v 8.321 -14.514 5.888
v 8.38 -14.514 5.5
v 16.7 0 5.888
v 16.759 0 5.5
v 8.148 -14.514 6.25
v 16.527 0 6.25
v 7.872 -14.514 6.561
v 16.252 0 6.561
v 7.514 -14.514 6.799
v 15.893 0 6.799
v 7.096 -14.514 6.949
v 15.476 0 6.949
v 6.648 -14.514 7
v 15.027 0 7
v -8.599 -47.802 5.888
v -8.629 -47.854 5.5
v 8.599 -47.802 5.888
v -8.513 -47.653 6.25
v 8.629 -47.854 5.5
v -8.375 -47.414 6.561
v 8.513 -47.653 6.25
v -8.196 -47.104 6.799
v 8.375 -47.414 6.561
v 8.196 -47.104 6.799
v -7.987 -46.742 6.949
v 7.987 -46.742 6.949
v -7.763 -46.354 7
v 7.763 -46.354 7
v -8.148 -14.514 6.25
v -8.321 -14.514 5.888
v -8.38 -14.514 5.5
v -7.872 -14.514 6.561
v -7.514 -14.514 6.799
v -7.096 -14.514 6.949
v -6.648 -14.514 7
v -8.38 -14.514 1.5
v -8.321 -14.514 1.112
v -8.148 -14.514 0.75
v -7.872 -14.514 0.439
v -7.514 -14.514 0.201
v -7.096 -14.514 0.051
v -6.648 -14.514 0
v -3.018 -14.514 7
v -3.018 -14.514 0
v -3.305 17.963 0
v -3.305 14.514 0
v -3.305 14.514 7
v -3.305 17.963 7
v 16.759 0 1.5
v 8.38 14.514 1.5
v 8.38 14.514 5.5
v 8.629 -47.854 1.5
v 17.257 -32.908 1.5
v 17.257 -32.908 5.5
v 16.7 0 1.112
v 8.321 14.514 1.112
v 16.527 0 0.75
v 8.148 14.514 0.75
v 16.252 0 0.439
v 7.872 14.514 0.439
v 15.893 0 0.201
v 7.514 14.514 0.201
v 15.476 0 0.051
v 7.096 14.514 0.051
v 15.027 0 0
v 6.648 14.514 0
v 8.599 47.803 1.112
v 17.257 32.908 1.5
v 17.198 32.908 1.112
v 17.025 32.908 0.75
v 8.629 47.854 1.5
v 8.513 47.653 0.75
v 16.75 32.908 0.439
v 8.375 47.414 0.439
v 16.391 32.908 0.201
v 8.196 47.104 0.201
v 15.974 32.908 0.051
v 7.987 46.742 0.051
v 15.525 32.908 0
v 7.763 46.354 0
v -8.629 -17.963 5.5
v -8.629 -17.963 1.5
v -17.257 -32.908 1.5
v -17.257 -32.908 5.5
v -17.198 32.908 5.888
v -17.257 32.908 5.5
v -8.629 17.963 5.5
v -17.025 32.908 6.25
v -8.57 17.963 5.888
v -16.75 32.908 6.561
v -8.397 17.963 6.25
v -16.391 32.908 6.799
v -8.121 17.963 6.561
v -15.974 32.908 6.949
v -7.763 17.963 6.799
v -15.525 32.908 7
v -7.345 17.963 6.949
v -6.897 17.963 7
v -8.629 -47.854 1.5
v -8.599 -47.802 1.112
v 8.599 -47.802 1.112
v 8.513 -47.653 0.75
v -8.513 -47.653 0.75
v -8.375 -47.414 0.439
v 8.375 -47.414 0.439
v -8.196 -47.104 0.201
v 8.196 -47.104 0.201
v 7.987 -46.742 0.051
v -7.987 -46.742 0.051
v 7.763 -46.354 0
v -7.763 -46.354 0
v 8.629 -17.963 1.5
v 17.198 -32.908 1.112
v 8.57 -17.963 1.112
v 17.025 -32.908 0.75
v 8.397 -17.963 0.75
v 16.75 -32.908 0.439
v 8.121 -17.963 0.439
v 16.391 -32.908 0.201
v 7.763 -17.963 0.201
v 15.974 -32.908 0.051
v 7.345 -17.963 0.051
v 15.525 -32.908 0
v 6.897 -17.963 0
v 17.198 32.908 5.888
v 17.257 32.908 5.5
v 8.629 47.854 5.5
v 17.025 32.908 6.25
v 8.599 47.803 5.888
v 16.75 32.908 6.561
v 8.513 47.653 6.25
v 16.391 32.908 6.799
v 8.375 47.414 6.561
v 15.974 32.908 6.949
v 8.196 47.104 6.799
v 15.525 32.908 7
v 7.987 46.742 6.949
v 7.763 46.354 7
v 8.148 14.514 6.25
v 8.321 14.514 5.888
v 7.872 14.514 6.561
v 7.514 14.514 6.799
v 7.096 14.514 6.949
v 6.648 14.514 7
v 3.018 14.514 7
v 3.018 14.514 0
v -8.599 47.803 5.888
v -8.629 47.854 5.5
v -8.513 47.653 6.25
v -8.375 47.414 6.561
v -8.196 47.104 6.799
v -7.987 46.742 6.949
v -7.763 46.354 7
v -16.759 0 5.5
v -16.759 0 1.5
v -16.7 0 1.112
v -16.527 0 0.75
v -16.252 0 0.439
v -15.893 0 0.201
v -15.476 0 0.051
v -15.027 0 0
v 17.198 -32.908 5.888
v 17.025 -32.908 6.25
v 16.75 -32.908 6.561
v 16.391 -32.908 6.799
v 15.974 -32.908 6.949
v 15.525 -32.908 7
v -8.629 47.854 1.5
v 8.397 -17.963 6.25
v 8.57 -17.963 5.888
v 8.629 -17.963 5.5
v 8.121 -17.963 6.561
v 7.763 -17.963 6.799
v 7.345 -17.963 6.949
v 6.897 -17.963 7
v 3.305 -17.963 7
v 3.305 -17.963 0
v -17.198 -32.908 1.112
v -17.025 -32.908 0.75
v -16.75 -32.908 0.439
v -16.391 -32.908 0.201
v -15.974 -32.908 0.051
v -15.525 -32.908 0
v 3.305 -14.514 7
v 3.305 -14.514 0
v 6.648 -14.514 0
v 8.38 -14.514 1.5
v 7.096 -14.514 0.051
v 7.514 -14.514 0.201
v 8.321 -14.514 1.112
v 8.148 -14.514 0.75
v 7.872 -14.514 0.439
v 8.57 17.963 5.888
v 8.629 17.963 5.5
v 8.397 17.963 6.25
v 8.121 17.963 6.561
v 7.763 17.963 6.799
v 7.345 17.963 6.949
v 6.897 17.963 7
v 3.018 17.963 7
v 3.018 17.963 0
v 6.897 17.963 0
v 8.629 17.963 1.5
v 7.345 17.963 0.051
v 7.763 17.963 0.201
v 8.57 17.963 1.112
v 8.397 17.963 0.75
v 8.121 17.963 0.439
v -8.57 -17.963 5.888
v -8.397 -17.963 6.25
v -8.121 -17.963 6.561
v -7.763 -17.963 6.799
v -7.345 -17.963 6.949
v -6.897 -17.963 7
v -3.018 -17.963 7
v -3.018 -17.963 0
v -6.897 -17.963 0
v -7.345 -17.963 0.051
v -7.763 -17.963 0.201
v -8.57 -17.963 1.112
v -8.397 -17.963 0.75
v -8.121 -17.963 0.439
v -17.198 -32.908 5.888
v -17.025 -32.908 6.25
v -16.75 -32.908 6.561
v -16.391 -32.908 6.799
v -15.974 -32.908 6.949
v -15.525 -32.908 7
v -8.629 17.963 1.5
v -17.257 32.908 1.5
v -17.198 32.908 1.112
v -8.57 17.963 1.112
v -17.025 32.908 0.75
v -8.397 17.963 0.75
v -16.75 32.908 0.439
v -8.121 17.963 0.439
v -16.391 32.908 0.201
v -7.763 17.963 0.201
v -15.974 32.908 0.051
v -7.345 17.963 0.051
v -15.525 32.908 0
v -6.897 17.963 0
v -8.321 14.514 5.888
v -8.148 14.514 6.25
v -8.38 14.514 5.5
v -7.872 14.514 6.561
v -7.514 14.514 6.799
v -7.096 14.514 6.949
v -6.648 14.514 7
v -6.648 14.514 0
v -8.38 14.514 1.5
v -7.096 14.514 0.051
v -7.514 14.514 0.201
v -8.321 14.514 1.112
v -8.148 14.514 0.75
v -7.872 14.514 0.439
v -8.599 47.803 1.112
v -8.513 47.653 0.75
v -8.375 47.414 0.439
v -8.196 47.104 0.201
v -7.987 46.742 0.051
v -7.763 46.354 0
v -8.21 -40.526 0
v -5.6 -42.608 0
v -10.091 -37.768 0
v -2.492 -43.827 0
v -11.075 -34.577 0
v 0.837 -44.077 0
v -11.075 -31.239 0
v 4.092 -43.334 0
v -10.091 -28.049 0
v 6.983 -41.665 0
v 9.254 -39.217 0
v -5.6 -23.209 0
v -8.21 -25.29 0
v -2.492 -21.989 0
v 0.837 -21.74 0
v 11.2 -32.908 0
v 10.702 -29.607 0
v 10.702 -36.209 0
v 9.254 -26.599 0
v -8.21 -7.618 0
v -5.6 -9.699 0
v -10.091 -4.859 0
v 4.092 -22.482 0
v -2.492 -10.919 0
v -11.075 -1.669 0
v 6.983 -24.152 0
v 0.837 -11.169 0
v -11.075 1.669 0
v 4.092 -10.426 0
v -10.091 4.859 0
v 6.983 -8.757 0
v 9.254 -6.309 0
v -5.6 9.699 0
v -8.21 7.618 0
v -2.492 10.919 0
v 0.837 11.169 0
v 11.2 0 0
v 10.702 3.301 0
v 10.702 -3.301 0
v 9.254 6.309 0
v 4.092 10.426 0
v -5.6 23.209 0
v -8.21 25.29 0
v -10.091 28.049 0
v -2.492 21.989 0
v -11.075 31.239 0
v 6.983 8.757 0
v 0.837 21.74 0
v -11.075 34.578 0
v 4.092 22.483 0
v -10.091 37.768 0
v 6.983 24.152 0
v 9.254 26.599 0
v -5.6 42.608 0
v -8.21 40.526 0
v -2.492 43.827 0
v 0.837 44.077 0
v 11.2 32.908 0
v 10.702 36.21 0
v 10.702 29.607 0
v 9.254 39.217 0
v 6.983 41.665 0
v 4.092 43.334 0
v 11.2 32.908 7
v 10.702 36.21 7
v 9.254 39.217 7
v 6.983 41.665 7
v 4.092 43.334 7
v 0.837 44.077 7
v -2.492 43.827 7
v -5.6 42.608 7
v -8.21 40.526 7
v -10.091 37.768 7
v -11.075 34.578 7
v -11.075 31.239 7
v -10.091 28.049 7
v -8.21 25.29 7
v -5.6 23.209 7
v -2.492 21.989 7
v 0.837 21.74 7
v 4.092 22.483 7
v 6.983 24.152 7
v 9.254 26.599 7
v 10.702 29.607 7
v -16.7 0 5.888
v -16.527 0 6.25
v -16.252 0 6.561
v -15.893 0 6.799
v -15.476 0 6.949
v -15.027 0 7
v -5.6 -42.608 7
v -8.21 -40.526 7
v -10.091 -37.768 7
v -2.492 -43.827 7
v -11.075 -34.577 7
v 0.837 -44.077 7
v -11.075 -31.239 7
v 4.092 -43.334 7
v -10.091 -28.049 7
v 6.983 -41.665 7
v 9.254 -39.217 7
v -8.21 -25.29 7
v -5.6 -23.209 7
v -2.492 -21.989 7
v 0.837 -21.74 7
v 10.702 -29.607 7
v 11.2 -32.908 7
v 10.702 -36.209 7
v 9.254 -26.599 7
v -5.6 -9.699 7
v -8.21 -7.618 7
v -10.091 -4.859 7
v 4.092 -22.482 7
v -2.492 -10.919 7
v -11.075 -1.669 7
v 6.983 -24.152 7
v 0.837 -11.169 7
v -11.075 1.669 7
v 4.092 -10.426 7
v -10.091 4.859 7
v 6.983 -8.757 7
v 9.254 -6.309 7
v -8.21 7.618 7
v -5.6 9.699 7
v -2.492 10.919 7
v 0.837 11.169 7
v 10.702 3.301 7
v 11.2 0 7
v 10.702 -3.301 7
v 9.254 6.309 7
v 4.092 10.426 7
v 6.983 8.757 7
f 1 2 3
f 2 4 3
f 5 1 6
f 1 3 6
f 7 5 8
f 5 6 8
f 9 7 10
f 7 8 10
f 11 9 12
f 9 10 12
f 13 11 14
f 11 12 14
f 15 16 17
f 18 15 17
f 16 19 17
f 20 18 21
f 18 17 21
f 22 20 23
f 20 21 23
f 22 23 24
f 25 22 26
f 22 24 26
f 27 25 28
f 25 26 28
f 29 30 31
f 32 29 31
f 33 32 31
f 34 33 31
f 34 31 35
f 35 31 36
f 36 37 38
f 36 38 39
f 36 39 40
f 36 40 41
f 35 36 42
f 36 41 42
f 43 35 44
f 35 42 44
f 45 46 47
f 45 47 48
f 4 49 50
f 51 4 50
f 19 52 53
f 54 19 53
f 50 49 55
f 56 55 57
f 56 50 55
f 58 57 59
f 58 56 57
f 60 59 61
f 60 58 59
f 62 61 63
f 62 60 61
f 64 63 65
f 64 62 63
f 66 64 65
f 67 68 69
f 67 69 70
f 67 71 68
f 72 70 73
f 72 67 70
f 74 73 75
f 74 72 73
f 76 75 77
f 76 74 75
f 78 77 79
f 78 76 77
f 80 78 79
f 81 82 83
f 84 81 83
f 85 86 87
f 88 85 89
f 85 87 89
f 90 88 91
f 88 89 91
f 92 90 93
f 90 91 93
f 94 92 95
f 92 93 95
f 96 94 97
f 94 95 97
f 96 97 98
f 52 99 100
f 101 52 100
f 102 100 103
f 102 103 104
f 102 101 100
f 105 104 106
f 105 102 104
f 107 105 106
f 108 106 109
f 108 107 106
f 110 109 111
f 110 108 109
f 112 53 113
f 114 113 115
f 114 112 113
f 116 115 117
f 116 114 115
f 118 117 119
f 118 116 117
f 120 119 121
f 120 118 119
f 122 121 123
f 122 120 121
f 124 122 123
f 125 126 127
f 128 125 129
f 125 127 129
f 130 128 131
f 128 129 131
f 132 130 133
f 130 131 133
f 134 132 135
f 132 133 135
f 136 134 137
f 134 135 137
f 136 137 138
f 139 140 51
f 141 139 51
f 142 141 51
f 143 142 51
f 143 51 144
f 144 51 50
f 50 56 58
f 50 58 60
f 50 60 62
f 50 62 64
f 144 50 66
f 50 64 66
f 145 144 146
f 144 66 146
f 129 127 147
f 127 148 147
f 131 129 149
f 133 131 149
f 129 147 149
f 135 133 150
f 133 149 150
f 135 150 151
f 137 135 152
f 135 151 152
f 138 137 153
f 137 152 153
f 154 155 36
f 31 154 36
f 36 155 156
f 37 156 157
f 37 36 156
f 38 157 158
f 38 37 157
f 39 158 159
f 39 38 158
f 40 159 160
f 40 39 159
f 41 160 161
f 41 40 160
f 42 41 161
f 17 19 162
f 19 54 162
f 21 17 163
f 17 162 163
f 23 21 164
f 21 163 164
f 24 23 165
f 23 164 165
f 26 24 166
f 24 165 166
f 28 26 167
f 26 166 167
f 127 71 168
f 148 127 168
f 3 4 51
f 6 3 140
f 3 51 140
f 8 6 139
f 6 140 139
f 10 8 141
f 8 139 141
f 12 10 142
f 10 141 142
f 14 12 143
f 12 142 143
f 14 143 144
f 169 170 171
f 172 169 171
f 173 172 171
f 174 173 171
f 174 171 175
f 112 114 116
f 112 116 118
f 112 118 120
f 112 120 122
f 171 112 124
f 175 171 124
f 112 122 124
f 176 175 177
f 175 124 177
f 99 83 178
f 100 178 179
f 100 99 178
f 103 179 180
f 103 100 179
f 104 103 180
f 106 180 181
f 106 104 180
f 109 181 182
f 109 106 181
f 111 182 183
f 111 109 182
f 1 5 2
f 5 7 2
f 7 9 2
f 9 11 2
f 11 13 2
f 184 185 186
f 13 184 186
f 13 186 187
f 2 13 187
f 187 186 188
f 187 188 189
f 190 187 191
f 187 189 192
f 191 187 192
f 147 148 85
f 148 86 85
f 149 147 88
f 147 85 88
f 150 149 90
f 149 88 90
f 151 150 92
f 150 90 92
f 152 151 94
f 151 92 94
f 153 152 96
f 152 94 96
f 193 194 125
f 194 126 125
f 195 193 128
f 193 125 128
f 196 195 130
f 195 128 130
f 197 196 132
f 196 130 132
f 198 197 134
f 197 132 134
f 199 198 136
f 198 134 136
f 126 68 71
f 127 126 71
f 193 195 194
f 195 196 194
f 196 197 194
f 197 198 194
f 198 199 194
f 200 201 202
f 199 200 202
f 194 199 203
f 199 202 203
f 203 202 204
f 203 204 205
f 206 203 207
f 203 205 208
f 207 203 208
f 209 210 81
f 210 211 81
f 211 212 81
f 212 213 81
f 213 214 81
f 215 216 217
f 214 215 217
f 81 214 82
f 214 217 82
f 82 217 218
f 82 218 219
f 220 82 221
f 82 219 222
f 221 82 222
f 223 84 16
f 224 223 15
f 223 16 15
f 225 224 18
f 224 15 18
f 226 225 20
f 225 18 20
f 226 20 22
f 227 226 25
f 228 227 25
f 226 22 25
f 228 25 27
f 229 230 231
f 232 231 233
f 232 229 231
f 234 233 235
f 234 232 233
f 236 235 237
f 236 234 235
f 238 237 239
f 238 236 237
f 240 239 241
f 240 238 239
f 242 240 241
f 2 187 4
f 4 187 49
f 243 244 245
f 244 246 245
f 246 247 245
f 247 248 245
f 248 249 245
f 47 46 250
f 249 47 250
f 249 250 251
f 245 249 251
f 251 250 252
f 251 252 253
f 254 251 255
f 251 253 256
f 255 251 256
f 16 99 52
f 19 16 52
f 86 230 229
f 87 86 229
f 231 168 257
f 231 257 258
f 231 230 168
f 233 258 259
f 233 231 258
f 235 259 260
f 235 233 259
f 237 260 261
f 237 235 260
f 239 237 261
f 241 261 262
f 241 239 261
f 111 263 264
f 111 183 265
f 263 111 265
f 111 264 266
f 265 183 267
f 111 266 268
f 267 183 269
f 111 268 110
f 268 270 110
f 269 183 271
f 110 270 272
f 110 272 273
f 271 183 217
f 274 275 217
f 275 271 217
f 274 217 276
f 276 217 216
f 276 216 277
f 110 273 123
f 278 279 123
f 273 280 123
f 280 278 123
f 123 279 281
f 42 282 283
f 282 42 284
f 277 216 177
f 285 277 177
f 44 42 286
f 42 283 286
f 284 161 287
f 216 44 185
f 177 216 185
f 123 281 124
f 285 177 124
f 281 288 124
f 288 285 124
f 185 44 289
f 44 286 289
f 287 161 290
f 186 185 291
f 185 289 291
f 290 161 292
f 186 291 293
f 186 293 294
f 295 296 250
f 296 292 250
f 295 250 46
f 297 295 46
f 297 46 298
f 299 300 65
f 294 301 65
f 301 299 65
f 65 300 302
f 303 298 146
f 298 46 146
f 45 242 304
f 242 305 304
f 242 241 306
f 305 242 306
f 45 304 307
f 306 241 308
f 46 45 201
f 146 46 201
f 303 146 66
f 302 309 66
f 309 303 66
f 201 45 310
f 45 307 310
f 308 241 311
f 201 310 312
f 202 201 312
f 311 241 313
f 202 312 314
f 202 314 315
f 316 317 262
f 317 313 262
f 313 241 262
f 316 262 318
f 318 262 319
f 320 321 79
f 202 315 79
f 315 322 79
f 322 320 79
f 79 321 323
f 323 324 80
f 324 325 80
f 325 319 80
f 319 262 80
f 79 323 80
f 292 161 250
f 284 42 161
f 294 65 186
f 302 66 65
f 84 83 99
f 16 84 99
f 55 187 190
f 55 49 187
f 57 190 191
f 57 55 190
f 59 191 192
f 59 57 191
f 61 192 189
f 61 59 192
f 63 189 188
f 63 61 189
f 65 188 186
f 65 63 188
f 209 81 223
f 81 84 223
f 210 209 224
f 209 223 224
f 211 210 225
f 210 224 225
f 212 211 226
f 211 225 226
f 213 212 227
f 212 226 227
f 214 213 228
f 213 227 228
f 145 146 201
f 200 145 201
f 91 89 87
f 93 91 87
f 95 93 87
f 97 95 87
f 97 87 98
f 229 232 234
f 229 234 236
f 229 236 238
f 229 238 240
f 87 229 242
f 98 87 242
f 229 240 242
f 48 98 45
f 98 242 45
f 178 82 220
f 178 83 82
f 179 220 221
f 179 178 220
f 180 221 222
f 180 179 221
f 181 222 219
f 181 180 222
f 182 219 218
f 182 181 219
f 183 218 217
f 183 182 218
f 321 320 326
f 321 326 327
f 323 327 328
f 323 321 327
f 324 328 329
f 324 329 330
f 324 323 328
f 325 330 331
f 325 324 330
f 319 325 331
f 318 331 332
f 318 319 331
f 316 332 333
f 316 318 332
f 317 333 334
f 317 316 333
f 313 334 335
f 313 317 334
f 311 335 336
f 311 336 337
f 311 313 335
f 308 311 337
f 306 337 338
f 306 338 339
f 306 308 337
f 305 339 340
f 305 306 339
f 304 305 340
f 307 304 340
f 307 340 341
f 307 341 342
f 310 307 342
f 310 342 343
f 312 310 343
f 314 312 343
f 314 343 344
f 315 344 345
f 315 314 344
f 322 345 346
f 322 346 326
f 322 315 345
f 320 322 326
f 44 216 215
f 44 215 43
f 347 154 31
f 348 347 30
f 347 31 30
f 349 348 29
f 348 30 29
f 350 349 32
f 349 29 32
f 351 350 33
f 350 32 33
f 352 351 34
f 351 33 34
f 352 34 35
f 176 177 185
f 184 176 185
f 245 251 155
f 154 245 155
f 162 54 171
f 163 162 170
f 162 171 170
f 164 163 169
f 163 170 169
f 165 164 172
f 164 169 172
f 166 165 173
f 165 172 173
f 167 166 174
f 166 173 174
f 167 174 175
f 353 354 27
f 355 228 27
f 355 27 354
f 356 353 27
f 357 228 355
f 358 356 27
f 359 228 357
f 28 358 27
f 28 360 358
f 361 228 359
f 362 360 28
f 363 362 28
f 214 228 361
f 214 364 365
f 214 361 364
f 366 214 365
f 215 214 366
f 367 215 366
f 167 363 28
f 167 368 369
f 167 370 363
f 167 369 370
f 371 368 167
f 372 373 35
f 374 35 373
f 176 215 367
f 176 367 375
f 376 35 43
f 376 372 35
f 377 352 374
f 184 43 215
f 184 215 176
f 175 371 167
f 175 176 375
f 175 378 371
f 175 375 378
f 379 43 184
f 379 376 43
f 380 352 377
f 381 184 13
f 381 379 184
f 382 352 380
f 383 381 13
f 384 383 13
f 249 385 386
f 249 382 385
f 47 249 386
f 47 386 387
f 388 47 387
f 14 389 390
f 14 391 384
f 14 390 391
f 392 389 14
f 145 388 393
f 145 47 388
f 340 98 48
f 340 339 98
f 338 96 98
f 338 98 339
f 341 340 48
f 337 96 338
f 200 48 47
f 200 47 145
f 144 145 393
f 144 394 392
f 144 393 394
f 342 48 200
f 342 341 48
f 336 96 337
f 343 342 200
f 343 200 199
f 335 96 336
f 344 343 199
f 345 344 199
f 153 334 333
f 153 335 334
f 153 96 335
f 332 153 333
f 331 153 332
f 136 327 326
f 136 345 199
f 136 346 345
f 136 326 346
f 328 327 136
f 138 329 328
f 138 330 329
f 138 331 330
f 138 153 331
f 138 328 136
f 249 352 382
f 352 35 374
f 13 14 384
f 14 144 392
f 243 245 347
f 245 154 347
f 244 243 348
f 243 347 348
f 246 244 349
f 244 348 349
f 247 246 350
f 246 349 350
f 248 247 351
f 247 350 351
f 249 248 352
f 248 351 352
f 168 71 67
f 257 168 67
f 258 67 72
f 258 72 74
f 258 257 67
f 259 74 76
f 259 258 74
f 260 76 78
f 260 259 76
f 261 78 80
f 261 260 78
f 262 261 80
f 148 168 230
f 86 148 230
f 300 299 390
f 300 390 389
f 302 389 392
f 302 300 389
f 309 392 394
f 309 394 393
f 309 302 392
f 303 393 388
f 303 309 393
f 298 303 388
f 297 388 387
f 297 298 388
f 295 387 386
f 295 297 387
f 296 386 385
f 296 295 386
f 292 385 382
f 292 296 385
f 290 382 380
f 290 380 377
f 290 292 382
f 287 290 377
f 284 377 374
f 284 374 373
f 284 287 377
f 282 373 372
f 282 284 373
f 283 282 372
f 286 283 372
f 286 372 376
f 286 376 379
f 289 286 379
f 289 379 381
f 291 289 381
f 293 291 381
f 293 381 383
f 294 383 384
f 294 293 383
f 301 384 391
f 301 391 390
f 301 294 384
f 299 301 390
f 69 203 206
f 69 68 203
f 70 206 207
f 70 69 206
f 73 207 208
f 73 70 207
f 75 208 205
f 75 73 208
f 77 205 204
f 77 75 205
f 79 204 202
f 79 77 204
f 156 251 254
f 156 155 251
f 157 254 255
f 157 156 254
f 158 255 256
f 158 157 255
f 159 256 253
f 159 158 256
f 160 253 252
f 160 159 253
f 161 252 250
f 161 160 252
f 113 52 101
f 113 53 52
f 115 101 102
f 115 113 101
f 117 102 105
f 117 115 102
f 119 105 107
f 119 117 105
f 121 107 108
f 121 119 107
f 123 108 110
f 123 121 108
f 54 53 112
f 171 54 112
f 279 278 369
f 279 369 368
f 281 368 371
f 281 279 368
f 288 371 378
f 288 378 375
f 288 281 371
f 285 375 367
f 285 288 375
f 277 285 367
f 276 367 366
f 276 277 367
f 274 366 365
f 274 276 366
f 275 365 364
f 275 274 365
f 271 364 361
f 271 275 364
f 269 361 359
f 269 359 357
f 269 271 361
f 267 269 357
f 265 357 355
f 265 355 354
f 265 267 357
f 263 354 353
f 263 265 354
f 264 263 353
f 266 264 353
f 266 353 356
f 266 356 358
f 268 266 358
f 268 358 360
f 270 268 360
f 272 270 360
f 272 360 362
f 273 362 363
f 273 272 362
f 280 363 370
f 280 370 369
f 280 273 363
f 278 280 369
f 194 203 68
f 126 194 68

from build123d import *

# Parameters (mm, degrees)
F0_R     = 11.2
F0_W     = 6.3229973894
F0_H     = 3.449
F1_DEPTH = 7
F2_R     = 1.5


# Not quite as in the source:
# - ends of sketch curves that miss each other by under 0.0002 mm in the source are joined


with BuildPart() as f1:
    # F0 (on Top) → F1 (new body)
    with BuildSketch(Plane.XY):
        Polygon((-3.3052028157, 17.9631426474), (3.0177945737, 17.9631426474), (8.6286484148, 17.9631426474), (17.2572757273, 32.9083635521), (8.628630128, 47.8536161306), (-8.628630128, 47.8536161306), (-17.2572757273, 32.9083635521), (-8.6286484148, 17.9631426474), align=None)
        with Locations((0, 32.9083055258)):
            Circle(F0_R, mode=Mode.SUBTRACT)
        Polygon((3.3052028157, -14.5141426474), (8.3797441645, -14.5141426474), (16.759488329, 0), (8.3797441645, 14.5141426474), (3.0177945737, 14.5141426474), (-3.3052028157, 14.5141426474), (-8.3797441645, 14.5141426474), (-16.759488329, 0), (-8.3797441645, -14.5141426474), (-3.0177945737, -14.5141426474), align=None)
        Circle(F0_R, mode=Mode.SUBTRACT)
        with Locations((-0.143704121, 16.2386426474)):
            Rectangle(F0_W, F0_H)
        Polygon((8.6286484148, -17.9630480707), (3.3052028157, -17.9630480707), (-3.0177945737, -17.9630480707), (-8.6286484148, -17.9630480707), (-17.2572757273, -32.9082689754), (-8.628630128, -47.8535215539), (8.628630128, -47.8535215539), (17.2572757273, -32.9082689754), align=None)
        with Locations((0, -32.9082109491)):
            Circle(F0_R, mode=Mode.SUBTRACT)
        with Locations((0.143704121, -16.2386426474)):
            Rectangle(F0_W, F0_H)
    extrude(amount=F1_DEPTH)

    # F2
    f2_edges = [f1.edges().sort_by_distance(p)[0] for p in [
        (-12.942953, 40.38099, 7),
        (0, 47.853616, 7),
        (12.942953, 40.38099, 7),
        (12.942962, 25.435753, 7),
        (-12.942962, 25.435753, 7),
        (-12.569616, 7.257071, 7),
        (12.569616, -7.257071, 7),
        (-12.569616, -7.257071, 7),
        (-12.942962, -25.435659, 7),
        (12.942962, -25.435659, 7),
        (12.942953, -40.380895, 7),
        (0, -47.853522, 7),
        (-12.942953, -40.380895, 7),
        (12.569616, 7.257071, 7),
        (-12.942953, -40.380895, 0),
        (0, -47.853522, 0),
        (12.942953, -40.380895, 0),
        (12.942962, -25.435659, 0),
        (-12.942962, -25.435659, 0),
        (-12.569616, -7.257071, 0),
        (12.569616, -7.257071, 0),
        (12.569616, 7.257071, 0),
        (-12.569616, 7.257071, 0),
        (-12.942962, 25.435753, 0),
        (-12.942953, 40.38099, 0),
        (12.942953, 40.38099, 0),
        (0, 47.853616, 0),
        (12.942962, 25.435753, 0),
    ]]
    fillet(f2_edges, radius=F2_R)


solid = f1.part
